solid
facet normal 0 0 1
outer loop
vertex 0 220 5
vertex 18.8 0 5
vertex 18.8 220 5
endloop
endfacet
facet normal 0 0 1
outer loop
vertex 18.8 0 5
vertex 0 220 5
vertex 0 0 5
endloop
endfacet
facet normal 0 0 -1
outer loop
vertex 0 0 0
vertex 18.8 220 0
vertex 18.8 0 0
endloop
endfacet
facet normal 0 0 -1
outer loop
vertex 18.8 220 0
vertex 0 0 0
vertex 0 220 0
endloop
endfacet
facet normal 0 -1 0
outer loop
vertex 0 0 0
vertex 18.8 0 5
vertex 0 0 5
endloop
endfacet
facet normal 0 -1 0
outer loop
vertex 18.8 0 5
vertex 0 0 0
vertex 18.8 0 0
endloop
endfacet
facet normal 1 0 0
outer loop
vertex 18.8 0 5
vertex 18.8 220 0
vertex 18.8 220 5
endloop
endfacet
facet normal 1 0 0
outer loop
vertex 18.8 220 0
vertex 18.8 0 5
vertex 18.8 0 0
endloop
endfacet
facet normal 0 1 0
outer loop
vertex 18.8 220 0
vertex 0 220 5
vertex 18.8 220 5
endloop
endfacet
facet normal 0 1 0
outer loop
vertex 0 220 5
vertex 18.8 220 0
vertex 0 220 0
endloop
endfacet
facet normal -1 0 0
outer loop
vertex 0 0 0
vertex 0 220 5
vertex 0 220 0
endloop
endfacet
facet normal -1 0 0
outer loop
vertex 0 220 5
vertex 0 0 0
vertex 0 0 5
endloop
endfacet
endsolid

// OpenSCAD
use <MCAD/triangles.scad>;

$fn=72;

l = 430;
w = 190;
h = 160;
boundary = 1;

pole_r = 12;
pole_wall = 2;

l_platform = 175;
h_platform = 20;

l_lock = 20;
w_lock = 220;
h_lock = 5;

// This is the boundary
// difference(){
//   cube([l,w,h]);
//   translate([boundary/2,boundary/2,0])
//     cube([l-boundary,w-boundary,h]);
// }

//
//difference(){
//  union(){
//    translate([pole_r, pole_r, 0])
//    rotate([0,0,-75])
//      supportBeam(h, pole_r, pole_wall);
//
//    translate([pole_r, w-pole_r, 0])
//    rotate([0,0,-105])
//      supportBeam(h, pole_r, pole_wall);
//
//    translate([l-pole_r, pole_r, 0])
//    rotate([0,0,75])
//      supportBeam(h, pole_r, pole_wall);
//
//    translate([l-pole_r, w-pole_r, 0])
//    rotate([0,0,105])
//      supportBeam(h, pole_r, pole_wall);
//    }
//    translate([l_platform/2,20,h/3-h_lock])
//    cube([l_lock,w_lock,h_lock]);
//}
//translate([l_platform/2+0.4,200-w_lock,h/3-h_lock])
cube([l_lock-1.2,w_lock,h_lock]);


module supportBeam(h, r_out, wall){
  difference(){
    union(){
      cylinder(h=h/3, r=r_out);

      translate([-r_out,r_out,r_out+h/3])
      rotate([90,0,90])
      hull()
      {
        r_platform_node = 1;
        translate([-r_out+r_platform_node,-r_out-r_platform_node,0])
        cylinder(h=r_out*2, r=r_platform_node);

        translate([-r_out+r_platform_node,-h_platform-r_out-r_platform_node,0])
        cylinder(h=r_out*2, r=r_platform_node);

        translate([l_platform-r_out,-r_out-r_platform_node*3,0])
        cylinder(h=r_out*2, r=r_platform_node*3);
      }
    } 
    cylinder(h=h/3, r=r_out-wall);
  }
}
